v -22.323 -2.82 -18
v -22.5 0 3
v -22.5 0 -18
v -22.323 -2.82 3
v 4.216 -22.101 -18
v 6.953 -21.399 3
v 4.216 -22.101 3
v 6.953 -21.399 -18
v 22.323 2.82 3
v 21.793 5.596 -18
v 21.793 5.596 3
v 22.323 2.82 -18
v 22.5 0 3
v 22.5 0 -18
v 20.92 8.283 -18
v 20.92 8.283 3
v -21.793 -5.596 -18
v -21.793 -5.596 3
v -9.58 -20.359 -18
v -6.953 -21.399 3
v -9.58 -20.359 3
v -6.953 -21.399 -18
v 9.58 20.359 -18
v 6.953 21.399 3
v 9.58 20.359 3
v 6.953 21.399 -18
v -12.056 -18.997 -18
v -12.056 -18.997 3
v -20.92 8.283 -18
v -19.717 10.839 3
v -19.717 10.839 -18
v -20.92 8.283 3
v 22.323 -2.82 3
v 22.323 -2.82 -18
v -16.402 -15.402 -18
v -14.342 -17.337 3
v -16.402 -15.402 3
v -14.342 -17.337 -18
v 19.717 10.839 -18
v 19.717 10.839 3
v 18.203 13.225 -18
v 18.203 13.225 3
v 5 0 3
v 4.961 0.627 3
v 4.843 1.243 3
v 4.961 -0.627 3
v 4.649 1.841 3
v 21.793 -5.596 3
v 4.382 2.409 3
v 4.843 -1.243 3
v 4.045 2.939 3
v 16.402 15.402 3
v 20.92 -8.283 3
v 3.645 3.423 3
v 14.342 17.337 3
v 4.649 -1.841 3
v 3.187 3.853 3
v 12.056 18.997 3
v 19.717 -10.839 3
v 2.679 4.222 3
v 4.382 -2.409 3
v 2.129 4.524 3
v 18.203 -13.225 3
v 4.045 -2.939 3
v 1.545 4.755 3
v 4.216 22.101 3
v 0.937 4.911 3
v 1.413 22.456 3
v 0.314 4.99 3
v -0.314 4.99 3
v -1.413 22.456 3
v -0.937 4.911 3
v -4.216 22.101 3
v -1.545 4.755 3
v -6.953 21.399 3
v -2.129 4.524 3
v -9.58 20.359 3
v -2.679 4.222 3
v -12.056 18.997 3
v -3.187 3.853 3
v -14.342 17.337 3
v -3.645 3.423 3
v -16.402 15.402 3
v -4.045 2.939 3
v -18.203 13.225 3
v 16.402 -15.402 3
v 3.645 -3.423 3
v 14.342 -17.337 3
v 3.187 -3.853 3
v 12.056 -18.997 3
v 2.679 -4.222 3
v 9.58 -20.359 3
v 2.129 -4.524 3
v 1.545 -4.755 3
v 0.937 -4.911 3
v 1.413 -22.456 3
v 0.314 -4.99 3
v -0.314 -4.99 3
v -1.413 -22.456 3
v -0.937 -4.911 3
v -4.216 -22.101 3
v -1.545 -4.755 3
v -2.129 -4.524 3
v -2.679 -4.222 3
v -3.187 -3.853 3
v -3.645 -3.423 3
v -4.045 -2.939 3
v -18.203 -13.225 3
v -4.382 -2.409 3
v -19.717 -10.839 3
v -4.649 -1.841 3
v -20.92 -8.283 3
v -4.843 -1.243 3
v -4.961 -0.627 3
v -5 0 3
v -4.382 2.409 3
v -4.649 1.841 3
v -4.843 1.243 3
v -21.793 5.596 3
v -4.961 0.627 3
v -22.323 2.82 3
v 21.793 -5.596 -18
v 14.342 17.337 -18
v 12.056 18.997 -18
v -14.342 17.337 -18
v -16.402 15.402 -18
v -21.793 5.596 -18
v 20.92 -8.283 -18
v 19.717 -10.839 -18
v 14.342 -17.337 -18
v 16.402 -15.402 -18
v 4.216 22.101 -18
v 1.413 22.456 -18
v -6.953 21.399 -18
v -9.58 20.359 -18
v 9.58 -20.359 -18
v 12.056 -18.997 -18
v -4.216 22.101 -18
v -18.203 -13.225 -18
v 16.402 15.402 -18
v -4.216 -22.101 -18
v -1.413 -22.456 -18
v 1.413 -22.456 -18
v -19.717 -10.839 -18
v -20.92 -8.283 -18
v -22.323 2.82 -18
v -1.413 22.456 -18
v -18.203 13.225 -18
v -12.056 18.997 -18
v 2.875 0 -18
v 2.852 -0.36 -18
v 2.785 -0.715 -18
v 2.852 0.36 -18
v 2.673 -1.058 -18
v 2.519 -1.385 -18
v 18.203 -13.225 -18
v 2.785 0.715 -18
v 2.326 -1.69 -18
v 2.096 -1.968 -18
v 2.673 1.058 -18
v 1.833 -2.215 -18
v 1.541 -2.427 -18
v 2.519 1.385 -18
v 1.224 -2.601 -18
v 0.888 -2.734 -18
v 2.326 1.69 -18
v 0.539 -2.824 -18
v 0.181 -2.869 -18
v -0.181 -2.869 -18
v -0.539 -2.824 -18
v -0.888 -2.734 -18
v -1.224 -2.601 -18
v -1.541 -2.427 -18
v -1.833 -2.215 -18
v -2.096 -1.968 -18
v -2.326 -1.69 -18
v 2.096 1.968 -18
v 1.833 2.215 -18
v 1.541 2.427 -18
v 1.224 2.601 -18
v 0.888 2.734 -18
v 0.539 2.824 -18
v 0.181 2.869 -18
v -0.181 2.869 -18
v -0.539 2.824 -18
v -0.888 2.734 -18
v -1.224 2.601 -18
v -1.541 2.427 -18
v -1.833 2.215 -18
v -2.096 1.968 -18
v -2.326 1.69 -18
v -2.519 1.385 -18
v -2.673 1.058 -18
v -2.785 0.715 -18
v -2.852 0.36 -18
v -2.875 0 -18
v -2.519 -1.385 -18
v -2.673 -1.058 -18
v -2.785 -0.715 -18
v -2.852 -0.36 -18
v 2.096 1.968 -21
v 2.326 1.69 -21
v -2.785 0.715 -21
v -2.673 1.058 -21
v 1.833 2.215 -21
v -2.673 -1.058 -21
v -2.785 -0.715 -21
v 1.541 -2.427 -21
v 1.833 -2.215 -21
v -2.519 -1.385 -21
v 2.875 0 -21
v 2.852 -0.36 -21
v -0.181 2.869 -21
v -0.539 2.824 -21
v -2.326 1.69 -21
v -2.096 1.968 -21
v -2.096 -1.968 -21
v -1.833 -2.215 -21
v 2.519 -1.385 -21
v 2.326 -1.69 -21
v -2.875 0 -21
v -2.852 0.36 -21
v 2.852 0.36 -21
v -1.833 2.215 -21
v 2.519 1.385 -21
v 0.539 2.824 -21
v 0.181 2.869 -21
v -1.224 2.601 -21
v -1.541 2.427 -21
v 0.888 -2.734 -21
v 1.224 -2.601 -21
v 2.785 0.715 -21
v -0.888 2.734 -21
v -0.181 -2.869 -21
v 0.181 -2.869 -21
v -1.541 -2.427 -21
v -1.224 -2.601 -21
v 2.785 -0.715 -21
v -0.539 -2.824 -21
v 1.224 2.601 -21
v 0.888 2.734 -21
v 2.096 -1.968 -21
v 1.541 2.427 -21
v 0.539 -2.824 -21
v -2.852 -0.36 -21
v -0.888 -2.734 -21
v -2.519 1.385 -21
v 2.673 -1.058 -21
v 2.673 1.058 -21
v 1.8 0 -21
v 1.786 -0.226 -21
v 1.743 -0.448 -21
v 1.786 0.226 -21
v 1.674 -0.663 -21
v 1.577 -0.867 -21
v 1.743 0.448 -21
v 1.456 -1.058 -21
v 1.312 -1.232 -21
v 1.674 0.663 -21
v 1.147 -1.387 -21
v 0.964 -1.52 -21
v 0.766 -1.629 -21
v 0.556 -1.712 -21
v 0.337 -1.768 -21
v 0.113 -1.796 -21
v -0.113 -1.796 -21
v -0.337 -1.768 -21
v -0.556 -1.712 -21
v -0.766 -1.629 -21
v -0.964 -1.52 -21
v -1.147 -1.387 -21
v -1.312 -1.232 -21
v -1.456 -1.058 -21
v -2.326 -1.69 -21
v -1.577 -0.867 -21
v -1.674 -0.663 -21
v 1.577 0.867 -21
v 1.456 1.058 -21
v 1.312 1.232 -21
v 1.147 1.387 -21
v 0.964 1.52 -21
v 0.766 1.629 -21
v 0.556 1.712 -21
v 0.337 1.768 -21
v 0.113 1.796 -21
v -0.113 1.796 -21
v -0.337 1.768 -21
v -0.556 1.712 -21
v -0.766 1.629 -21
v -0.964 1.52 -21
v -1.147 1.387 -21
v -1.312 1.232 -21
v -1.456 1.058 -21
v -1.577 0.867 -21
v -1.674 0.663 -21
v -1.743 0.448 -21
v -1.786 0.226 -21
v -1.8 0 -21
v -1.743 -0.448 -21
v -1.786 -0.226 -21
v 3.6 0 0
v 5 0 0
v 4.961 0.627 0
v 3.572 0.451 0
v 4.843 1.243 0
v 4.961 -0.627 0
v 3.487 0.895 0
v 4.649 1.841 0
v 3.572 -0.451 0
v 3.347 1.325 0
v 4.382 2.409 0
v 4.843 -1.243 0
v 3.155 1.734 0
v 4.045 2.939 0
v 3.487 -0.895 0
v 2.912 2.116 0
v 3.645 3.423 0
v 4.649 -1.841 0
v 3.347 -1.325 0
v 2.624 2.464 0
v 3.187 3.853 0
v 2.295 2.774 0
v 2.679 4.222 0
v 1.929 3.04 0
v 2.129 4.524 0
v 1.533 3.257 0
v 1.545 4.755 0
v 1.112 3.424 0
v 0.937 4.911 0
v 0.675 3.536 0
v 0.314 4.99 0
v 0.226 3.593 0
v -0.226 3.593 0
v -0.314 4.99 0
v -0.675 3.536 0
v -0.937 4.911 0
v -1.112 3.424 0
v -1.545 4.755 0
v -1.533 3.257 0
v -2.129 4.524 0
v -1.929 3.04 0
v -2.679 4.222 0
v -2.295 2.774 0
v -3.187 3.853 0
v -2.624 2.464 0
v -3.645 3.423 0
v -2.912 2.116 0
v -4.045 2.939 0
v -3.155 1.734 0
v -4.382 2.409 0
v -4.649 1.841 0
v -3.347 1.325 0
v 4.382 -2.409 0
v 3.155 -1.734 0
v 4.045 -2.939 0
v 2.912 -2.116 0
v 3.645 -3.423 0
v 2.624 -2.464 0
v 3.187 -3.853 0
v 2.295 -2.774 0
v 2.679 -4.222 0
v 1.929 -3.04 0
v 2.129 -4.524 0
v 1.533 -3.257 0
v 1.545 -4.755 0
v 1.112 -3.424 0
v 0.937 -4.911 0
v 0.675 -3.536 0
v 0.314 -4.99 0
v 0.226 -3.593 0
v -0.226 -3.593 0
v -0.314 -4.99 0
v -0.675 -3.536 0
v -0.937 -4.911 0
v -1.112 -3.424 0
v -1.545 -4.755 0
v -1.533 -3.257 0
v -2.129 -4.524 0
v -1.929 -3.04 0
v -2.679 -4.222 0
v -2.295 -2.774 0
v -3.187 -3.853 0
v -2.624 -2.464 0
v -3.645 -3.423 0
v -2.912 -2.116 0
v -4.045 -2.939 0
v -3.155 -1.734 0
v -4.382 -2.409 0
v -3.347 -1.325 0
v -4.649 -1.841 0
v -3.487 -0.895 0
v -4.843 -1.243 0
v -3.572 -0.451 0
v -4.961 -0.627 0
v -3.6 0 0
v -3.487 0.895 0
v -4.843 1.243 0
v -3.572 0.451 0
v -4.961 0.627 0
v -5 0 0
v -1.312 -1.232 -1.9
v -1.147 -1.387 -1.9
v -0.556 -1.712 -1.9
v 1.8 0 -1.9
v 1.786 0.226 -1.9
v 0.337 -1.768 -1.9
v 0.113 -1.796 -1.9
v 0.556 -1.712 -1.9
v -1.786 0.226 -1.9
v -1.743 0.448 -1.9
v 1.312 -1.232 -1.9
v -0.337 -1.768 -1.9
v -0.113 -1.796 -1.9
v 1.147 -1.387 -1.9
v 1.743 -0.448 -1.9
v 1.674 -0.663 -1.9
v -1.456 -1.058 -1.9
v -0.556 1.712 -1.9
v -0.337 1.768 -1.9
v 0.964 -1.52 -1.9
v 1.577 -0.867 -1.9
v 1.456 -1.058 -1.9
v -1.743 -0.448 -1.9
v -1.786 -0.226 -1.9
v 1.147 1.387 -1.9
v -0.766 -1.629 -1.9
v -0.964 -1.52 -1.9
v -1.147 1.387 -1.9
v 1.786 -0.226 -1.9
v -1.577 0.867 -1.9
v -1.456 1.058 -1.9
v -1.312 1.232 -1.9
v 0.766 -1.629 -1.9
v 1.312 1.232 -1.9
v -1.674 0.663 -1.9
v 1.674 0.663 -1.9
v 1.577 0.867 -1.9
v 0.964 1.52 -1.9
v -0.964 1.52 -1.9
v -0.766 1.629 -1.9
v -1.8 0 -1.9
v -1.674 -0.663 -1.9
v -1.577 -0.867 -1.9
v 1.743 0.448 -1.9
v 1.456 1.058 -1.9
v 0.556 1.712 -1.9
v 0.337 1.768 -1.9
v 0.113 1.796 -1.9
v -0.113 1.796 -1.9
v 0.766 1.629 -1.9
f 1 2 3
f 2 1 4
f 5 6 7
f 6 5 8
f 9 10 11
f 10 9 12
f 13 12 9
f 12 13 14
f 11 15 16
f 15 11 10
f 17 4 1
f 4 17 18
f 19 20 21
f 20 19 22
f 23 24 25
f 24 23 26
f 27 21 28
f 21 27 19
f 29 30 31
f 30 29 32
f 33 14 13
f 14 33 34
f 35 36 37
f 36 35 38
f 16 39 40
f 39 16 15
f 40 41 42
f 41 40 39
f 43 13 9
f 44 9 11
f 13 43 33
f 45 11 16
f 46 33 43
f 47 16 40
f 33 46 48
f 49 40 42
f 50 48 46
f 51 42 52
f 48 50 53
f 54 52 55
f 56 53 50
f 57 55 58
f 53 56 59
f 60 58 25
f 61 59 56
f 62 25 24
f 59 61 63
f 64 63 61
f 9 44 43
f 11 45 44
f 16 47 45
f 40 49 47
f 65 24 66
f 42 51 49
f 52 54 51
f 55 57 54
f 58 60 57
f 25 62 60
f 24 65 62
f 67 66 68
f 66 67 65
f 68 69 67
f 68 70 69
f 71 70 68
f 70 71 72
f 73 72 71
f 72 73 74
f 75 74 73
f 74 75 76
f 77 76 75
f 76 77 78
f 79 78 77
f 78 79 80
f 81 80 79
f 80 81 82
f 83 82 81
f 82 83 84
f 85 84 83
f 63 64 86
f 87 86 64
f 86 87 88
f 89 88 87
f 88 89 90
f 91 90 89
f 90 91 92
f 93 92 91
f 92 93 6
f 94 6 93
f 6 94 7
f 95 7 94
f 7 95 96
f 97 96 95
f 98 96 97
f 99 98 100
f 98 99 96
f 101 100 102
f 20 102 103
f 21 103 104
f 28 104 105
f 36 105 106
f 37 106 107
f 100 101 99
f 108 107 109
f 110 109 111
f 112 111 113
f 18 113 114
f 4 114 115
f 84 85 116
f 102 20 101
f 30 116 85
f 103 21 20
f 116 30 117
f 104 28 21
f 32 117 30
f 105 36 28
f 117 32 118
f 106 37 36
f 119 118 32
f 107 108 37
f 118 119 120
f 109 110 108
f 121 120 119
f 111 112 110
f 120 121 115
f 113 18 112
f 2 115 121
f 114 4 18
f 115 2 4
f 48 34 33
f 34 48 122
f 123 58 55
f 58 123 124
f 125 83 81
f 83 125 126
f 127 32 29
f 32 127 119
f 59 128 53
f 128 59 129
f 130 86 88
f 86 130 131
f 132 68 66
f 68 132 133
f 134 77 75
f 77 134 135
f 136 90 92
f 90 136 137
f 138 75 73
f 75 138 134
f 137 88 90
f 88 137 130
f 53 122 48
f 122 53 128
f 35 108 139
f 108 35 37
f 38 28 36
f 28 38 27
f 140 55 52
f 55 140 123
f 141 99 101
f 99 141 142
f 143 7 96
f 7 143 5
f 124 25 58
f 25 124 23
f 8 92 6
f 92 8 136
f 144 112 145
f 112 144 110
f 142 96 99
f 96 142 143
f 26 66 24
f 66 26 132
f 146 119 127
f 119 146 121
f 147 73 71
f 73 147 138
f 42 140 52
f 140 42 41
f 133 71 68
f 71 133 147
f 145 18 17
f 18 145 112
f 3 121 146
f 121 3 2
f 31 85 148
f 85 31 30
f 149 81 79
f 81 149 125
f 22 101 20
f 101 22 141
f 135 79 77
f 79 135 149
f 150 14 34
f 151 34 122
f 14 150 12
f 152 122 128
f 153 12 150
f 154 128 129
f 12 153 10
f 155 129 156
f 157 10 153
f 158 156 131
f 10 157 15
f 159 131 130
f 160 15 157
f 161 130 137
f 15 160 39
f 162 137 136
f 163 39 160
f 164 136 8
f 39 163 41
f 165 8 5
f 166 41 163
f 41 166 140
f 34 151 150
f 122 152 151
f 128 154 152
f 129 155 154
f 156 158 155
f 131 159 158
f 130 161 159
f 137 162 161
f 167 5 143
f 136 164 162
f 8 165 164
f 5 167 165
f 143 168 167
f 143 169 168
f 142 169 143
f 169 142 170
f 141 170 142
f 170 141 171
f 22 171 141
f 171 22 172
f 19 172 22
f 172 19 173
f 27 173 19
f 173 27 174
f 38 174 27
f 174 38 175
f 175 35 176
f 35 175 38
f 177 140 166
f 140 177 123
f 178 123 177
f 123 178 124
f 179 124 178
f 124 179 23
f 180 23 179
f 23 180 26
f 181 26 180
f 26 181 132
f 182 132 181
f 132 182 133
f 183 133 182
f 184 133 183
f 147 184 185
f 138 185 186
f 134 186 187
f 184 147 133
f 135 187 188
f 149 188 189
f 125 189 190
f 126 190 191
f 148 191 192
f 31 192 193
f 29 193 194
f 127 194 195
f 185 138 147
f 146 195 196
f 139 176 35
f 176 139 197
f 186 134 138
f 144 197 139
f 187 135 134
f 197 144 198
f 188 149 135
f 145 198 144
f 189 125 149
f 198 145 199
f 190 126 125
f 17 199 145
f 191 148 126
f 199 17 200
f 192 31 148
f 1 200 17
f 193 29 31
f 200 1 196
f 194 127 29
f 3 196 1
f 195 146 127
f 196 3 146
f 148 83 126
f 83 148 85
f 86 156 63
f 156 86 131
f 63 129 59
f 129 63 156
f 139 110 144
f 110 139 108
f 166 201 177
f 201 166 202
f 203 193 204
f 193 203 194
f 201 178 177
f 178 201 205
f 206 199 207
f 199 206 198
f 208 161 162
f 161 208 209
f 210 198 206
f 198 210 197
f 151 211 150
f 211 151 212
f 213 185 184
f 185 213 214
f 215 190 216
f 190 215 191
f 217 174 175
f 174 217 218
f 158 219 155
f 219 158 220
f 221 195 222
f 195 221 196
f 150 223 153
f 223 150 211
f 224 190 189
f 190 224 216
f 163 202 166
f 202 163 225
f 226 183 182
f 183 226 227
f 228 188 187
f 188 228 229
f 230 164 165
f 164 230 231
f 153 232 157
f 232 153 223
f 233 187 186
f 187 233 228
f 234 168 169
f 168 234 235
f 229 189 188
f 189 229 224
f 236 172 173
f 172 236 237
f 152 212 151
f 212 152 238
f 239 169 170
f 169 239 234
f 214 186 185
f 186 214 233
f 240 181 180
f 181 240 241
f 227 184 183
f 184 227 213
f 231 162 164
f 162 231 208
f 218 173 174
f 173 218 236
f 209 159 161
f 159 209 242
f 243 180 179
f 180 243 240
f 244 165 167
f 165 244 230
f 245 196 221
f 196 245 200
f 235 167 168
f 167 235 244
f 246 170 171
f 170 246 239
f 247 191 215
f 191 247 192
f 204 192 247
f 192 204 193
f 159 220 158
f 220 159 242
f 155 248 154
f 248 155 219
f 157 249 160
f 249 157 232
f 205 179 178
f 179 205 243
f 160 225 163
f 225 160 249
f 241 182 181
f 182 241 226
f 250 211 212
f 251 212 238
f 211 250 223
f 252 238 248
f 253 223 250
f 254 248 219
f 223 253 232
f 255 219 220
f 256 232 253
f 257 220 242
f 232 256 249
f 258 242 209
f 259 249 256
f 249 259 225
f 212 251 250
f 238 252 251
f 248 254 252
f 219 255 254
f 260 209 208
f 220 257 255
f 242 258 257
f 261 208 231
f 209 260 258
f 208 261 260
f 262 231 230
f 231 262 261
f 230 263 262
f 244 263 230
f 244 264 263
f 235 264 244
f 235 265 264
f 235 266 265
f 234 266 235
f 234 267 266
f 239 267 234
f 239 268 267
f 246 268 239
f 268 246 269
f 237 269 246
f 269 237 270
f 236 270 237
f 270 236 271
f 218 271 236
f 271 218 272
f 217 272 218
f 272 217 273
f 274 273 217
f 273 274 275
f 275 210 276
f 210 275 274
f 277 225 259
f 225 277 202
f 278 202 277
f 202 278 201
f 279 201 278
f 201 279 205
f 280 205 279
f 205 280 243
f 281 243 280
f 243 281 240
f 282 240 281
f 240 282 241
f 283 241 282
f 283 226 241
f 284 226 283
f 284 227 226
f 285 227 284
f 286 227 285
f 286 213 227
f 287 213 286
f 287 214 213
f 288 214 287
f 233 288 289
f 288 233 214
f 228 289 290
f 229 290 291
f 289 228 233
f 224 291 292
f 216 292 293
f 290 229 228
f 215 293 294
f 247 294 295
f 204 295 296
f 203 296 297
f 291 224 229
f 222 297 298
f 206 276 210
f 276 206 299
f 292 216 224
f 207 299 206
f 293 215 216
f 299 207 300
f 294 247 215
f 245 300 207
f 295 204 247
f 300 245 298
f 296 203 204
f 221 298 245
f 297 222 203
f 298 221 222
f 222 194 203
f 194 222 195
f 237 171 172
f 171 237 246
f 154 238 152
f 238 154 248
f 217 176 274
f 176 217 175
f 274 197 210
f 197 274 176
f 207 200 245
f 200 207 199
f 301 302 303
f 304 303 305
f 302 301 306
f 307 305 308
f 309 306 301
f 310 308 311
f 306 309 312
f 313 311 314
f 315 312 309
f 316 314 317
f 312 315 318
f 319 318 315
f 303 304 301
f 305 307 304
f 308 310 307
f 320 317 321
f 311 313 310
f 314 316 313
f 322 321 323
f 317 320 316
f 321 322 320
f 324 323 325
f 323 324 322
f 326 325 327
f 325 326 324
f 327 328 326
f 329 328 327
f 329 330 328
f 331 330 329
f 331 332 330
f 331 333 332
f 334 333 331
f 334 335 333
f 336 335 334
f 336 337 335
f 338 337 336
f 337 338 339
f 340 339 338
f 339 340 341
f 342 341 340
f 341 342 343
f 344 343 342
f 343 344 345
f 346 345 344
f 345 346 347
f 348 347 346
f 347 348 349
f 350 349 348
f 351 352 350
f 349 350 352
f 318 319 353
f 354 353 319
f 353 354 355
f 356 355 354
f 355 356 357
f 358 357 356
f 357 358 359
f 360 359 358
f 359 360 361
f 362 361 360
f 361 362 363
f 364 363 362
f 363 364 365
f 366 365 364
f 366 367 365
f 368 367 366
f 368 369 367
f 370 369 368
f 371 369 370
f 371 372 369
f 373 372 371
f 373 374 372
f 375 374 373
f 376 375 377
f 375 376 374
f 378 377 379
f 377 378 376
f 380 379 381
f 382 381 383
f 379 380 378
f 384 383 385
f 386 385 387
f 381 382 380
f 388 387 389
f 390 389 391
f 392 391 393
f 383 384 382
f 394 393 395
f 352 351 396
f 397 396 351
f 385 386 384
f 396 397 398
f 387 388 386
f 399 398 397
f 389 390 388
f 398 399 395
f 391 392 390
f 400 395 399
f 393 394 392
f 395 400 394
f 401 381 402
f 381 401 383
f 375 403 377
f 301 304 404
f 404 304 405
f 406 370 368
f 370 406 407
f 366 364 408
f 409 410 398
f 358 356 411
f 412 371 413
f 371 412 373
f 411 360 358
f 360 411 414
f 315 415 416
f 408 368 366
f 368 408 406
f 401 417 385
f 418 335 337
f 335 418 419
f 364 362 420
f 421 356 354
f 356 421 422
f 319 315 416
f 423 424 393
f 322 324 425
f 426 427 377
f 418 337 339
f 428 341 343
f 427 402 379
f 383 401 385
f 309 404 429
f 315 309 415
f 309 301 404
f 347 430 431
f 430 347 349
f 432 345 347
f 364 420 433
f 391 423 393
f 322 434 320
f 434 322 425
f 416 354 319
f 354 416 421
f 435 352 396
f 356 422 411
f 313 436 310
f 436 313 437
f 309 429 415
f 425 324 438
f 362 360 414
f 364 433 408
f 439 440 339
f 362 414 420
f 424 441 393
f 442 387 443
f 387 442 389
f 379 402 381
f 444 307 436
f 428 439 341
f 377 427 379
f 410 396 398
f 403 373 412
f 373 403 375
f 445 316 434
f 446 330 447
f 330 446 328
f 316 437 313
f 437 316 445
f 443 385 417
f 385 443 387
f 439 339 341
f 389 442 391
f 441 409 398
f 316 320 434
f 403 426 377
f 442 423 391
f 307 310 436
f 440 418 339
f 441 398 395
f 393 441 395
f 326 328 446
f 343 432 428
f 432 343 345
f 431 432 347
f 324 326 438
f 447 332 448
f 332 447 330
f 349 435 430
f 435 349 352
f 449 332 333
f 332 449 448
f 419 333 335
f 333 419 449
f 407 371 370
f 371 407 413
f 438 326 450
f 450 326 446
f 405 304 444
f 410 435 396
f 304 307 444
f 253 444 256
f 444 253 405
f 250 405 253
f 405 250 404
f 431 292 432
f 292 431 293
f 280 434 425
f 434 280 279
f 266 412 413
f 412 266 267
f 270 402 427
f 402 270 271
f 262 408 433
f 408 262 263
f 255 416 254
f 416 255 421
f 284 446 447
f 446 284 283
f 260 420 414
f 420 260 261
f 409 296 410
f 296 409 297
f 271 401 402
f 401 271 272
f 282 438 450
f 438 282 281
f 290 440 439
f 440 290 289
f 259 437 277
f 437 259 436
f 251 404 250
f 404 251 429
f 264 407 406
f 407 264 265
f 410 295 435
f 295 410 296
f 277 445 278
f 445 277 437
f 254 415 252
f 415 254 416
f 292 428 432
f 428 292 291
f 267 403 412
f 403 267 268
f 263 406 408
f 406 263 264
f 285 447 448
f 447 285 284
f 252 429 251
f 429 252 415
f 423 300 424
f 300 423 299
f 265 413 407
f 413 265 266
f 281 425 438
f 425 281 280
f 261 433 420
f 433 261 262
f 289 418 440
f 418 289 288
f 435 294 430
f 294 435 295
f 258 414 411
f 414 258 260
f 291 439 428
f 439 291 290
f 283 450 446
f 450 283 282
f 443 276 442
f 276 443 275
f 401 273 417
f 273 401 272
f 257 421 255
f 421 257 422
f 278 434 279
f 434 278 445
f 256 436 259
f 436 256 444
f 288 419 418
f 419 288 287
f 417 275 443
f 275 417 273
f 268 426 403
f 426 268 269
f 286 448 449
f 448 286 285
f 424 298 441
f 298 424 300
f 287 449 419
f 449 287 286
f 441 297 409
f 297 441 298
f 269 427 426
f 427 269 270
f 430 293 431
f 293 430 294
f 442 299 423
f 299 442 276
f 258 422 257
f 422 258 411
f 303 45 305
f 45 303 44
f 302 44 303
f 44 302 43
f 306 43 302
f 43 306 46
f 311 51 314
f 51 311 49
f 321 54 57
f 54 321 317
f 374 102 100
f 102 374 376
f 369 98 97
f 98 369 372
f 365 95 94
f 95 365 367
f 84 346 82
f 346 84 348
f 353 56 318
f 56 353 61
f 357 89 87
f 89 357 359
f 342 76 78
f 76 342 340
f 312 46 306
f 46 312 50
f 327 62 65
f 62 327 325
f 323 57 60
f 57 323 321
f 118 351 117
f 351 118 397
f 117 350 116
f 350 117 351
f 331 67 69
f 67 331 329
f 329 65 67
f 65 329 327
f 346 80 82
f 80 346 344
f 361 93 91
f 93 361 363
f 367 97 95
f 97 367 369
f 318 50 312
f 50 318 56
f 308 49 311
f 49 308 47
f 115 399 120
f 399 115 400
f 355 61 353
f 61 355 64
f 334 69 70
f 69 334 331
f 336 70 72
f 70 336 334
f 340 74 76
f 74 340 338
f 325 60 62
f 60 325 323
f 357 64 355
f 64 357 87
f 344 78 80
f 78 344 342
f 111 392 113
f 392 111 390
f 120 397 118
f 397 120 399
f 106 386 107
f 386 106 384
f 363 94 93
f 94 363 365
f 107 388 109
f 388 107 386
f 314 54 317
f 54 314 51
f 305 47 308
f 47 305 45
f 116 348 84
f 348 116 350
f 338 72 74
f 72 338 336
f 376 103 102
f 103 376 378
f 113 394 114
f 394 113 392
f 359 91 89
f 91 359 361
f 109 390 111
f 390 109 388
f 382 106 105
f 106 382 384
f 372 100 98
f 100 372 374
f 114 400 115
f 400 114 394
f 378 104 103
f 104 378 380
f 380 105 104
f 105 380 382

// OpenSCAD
$fn = 50;


difference() {
	union() {
		translate(v = [0, 0, -18.0000000000]) {
			cylinder(h = 21, r = 22.5000000000);
		}
		#translate(v = [0, 0, -21.0000000000]) {
			cylinder(h = 21, r = 2.8750000000);
		}
	}
	union() {
		translate(v = [0, 0, 0]) {
			rotate(a = [0, 0, 0]) {
				difference() {
					union() {
						translate(v = [0, 0, -21.0000000000]) {
							cylinder(h = 21, r = 1.5000000000);
						}
						translate(v = [0, 0, -1.9000000000]) {
							cylinder(h = 1.9000000000, r1 = 1.8000000000, r2 = 3.6000000000);
						}
						translate(v = [0, 0, -21.0000000000]) {
							cylinder(h = 21, r = 1.8000000000);
						}
						translate(v = [0, 0, -21.0000000000]) {
							cylinder(h = 21, r = 1.5000000000);
						}
					}
					union();
				}
			}
		}
		#cylinder(h = 3, r = 5.0000000000);
	}
}
